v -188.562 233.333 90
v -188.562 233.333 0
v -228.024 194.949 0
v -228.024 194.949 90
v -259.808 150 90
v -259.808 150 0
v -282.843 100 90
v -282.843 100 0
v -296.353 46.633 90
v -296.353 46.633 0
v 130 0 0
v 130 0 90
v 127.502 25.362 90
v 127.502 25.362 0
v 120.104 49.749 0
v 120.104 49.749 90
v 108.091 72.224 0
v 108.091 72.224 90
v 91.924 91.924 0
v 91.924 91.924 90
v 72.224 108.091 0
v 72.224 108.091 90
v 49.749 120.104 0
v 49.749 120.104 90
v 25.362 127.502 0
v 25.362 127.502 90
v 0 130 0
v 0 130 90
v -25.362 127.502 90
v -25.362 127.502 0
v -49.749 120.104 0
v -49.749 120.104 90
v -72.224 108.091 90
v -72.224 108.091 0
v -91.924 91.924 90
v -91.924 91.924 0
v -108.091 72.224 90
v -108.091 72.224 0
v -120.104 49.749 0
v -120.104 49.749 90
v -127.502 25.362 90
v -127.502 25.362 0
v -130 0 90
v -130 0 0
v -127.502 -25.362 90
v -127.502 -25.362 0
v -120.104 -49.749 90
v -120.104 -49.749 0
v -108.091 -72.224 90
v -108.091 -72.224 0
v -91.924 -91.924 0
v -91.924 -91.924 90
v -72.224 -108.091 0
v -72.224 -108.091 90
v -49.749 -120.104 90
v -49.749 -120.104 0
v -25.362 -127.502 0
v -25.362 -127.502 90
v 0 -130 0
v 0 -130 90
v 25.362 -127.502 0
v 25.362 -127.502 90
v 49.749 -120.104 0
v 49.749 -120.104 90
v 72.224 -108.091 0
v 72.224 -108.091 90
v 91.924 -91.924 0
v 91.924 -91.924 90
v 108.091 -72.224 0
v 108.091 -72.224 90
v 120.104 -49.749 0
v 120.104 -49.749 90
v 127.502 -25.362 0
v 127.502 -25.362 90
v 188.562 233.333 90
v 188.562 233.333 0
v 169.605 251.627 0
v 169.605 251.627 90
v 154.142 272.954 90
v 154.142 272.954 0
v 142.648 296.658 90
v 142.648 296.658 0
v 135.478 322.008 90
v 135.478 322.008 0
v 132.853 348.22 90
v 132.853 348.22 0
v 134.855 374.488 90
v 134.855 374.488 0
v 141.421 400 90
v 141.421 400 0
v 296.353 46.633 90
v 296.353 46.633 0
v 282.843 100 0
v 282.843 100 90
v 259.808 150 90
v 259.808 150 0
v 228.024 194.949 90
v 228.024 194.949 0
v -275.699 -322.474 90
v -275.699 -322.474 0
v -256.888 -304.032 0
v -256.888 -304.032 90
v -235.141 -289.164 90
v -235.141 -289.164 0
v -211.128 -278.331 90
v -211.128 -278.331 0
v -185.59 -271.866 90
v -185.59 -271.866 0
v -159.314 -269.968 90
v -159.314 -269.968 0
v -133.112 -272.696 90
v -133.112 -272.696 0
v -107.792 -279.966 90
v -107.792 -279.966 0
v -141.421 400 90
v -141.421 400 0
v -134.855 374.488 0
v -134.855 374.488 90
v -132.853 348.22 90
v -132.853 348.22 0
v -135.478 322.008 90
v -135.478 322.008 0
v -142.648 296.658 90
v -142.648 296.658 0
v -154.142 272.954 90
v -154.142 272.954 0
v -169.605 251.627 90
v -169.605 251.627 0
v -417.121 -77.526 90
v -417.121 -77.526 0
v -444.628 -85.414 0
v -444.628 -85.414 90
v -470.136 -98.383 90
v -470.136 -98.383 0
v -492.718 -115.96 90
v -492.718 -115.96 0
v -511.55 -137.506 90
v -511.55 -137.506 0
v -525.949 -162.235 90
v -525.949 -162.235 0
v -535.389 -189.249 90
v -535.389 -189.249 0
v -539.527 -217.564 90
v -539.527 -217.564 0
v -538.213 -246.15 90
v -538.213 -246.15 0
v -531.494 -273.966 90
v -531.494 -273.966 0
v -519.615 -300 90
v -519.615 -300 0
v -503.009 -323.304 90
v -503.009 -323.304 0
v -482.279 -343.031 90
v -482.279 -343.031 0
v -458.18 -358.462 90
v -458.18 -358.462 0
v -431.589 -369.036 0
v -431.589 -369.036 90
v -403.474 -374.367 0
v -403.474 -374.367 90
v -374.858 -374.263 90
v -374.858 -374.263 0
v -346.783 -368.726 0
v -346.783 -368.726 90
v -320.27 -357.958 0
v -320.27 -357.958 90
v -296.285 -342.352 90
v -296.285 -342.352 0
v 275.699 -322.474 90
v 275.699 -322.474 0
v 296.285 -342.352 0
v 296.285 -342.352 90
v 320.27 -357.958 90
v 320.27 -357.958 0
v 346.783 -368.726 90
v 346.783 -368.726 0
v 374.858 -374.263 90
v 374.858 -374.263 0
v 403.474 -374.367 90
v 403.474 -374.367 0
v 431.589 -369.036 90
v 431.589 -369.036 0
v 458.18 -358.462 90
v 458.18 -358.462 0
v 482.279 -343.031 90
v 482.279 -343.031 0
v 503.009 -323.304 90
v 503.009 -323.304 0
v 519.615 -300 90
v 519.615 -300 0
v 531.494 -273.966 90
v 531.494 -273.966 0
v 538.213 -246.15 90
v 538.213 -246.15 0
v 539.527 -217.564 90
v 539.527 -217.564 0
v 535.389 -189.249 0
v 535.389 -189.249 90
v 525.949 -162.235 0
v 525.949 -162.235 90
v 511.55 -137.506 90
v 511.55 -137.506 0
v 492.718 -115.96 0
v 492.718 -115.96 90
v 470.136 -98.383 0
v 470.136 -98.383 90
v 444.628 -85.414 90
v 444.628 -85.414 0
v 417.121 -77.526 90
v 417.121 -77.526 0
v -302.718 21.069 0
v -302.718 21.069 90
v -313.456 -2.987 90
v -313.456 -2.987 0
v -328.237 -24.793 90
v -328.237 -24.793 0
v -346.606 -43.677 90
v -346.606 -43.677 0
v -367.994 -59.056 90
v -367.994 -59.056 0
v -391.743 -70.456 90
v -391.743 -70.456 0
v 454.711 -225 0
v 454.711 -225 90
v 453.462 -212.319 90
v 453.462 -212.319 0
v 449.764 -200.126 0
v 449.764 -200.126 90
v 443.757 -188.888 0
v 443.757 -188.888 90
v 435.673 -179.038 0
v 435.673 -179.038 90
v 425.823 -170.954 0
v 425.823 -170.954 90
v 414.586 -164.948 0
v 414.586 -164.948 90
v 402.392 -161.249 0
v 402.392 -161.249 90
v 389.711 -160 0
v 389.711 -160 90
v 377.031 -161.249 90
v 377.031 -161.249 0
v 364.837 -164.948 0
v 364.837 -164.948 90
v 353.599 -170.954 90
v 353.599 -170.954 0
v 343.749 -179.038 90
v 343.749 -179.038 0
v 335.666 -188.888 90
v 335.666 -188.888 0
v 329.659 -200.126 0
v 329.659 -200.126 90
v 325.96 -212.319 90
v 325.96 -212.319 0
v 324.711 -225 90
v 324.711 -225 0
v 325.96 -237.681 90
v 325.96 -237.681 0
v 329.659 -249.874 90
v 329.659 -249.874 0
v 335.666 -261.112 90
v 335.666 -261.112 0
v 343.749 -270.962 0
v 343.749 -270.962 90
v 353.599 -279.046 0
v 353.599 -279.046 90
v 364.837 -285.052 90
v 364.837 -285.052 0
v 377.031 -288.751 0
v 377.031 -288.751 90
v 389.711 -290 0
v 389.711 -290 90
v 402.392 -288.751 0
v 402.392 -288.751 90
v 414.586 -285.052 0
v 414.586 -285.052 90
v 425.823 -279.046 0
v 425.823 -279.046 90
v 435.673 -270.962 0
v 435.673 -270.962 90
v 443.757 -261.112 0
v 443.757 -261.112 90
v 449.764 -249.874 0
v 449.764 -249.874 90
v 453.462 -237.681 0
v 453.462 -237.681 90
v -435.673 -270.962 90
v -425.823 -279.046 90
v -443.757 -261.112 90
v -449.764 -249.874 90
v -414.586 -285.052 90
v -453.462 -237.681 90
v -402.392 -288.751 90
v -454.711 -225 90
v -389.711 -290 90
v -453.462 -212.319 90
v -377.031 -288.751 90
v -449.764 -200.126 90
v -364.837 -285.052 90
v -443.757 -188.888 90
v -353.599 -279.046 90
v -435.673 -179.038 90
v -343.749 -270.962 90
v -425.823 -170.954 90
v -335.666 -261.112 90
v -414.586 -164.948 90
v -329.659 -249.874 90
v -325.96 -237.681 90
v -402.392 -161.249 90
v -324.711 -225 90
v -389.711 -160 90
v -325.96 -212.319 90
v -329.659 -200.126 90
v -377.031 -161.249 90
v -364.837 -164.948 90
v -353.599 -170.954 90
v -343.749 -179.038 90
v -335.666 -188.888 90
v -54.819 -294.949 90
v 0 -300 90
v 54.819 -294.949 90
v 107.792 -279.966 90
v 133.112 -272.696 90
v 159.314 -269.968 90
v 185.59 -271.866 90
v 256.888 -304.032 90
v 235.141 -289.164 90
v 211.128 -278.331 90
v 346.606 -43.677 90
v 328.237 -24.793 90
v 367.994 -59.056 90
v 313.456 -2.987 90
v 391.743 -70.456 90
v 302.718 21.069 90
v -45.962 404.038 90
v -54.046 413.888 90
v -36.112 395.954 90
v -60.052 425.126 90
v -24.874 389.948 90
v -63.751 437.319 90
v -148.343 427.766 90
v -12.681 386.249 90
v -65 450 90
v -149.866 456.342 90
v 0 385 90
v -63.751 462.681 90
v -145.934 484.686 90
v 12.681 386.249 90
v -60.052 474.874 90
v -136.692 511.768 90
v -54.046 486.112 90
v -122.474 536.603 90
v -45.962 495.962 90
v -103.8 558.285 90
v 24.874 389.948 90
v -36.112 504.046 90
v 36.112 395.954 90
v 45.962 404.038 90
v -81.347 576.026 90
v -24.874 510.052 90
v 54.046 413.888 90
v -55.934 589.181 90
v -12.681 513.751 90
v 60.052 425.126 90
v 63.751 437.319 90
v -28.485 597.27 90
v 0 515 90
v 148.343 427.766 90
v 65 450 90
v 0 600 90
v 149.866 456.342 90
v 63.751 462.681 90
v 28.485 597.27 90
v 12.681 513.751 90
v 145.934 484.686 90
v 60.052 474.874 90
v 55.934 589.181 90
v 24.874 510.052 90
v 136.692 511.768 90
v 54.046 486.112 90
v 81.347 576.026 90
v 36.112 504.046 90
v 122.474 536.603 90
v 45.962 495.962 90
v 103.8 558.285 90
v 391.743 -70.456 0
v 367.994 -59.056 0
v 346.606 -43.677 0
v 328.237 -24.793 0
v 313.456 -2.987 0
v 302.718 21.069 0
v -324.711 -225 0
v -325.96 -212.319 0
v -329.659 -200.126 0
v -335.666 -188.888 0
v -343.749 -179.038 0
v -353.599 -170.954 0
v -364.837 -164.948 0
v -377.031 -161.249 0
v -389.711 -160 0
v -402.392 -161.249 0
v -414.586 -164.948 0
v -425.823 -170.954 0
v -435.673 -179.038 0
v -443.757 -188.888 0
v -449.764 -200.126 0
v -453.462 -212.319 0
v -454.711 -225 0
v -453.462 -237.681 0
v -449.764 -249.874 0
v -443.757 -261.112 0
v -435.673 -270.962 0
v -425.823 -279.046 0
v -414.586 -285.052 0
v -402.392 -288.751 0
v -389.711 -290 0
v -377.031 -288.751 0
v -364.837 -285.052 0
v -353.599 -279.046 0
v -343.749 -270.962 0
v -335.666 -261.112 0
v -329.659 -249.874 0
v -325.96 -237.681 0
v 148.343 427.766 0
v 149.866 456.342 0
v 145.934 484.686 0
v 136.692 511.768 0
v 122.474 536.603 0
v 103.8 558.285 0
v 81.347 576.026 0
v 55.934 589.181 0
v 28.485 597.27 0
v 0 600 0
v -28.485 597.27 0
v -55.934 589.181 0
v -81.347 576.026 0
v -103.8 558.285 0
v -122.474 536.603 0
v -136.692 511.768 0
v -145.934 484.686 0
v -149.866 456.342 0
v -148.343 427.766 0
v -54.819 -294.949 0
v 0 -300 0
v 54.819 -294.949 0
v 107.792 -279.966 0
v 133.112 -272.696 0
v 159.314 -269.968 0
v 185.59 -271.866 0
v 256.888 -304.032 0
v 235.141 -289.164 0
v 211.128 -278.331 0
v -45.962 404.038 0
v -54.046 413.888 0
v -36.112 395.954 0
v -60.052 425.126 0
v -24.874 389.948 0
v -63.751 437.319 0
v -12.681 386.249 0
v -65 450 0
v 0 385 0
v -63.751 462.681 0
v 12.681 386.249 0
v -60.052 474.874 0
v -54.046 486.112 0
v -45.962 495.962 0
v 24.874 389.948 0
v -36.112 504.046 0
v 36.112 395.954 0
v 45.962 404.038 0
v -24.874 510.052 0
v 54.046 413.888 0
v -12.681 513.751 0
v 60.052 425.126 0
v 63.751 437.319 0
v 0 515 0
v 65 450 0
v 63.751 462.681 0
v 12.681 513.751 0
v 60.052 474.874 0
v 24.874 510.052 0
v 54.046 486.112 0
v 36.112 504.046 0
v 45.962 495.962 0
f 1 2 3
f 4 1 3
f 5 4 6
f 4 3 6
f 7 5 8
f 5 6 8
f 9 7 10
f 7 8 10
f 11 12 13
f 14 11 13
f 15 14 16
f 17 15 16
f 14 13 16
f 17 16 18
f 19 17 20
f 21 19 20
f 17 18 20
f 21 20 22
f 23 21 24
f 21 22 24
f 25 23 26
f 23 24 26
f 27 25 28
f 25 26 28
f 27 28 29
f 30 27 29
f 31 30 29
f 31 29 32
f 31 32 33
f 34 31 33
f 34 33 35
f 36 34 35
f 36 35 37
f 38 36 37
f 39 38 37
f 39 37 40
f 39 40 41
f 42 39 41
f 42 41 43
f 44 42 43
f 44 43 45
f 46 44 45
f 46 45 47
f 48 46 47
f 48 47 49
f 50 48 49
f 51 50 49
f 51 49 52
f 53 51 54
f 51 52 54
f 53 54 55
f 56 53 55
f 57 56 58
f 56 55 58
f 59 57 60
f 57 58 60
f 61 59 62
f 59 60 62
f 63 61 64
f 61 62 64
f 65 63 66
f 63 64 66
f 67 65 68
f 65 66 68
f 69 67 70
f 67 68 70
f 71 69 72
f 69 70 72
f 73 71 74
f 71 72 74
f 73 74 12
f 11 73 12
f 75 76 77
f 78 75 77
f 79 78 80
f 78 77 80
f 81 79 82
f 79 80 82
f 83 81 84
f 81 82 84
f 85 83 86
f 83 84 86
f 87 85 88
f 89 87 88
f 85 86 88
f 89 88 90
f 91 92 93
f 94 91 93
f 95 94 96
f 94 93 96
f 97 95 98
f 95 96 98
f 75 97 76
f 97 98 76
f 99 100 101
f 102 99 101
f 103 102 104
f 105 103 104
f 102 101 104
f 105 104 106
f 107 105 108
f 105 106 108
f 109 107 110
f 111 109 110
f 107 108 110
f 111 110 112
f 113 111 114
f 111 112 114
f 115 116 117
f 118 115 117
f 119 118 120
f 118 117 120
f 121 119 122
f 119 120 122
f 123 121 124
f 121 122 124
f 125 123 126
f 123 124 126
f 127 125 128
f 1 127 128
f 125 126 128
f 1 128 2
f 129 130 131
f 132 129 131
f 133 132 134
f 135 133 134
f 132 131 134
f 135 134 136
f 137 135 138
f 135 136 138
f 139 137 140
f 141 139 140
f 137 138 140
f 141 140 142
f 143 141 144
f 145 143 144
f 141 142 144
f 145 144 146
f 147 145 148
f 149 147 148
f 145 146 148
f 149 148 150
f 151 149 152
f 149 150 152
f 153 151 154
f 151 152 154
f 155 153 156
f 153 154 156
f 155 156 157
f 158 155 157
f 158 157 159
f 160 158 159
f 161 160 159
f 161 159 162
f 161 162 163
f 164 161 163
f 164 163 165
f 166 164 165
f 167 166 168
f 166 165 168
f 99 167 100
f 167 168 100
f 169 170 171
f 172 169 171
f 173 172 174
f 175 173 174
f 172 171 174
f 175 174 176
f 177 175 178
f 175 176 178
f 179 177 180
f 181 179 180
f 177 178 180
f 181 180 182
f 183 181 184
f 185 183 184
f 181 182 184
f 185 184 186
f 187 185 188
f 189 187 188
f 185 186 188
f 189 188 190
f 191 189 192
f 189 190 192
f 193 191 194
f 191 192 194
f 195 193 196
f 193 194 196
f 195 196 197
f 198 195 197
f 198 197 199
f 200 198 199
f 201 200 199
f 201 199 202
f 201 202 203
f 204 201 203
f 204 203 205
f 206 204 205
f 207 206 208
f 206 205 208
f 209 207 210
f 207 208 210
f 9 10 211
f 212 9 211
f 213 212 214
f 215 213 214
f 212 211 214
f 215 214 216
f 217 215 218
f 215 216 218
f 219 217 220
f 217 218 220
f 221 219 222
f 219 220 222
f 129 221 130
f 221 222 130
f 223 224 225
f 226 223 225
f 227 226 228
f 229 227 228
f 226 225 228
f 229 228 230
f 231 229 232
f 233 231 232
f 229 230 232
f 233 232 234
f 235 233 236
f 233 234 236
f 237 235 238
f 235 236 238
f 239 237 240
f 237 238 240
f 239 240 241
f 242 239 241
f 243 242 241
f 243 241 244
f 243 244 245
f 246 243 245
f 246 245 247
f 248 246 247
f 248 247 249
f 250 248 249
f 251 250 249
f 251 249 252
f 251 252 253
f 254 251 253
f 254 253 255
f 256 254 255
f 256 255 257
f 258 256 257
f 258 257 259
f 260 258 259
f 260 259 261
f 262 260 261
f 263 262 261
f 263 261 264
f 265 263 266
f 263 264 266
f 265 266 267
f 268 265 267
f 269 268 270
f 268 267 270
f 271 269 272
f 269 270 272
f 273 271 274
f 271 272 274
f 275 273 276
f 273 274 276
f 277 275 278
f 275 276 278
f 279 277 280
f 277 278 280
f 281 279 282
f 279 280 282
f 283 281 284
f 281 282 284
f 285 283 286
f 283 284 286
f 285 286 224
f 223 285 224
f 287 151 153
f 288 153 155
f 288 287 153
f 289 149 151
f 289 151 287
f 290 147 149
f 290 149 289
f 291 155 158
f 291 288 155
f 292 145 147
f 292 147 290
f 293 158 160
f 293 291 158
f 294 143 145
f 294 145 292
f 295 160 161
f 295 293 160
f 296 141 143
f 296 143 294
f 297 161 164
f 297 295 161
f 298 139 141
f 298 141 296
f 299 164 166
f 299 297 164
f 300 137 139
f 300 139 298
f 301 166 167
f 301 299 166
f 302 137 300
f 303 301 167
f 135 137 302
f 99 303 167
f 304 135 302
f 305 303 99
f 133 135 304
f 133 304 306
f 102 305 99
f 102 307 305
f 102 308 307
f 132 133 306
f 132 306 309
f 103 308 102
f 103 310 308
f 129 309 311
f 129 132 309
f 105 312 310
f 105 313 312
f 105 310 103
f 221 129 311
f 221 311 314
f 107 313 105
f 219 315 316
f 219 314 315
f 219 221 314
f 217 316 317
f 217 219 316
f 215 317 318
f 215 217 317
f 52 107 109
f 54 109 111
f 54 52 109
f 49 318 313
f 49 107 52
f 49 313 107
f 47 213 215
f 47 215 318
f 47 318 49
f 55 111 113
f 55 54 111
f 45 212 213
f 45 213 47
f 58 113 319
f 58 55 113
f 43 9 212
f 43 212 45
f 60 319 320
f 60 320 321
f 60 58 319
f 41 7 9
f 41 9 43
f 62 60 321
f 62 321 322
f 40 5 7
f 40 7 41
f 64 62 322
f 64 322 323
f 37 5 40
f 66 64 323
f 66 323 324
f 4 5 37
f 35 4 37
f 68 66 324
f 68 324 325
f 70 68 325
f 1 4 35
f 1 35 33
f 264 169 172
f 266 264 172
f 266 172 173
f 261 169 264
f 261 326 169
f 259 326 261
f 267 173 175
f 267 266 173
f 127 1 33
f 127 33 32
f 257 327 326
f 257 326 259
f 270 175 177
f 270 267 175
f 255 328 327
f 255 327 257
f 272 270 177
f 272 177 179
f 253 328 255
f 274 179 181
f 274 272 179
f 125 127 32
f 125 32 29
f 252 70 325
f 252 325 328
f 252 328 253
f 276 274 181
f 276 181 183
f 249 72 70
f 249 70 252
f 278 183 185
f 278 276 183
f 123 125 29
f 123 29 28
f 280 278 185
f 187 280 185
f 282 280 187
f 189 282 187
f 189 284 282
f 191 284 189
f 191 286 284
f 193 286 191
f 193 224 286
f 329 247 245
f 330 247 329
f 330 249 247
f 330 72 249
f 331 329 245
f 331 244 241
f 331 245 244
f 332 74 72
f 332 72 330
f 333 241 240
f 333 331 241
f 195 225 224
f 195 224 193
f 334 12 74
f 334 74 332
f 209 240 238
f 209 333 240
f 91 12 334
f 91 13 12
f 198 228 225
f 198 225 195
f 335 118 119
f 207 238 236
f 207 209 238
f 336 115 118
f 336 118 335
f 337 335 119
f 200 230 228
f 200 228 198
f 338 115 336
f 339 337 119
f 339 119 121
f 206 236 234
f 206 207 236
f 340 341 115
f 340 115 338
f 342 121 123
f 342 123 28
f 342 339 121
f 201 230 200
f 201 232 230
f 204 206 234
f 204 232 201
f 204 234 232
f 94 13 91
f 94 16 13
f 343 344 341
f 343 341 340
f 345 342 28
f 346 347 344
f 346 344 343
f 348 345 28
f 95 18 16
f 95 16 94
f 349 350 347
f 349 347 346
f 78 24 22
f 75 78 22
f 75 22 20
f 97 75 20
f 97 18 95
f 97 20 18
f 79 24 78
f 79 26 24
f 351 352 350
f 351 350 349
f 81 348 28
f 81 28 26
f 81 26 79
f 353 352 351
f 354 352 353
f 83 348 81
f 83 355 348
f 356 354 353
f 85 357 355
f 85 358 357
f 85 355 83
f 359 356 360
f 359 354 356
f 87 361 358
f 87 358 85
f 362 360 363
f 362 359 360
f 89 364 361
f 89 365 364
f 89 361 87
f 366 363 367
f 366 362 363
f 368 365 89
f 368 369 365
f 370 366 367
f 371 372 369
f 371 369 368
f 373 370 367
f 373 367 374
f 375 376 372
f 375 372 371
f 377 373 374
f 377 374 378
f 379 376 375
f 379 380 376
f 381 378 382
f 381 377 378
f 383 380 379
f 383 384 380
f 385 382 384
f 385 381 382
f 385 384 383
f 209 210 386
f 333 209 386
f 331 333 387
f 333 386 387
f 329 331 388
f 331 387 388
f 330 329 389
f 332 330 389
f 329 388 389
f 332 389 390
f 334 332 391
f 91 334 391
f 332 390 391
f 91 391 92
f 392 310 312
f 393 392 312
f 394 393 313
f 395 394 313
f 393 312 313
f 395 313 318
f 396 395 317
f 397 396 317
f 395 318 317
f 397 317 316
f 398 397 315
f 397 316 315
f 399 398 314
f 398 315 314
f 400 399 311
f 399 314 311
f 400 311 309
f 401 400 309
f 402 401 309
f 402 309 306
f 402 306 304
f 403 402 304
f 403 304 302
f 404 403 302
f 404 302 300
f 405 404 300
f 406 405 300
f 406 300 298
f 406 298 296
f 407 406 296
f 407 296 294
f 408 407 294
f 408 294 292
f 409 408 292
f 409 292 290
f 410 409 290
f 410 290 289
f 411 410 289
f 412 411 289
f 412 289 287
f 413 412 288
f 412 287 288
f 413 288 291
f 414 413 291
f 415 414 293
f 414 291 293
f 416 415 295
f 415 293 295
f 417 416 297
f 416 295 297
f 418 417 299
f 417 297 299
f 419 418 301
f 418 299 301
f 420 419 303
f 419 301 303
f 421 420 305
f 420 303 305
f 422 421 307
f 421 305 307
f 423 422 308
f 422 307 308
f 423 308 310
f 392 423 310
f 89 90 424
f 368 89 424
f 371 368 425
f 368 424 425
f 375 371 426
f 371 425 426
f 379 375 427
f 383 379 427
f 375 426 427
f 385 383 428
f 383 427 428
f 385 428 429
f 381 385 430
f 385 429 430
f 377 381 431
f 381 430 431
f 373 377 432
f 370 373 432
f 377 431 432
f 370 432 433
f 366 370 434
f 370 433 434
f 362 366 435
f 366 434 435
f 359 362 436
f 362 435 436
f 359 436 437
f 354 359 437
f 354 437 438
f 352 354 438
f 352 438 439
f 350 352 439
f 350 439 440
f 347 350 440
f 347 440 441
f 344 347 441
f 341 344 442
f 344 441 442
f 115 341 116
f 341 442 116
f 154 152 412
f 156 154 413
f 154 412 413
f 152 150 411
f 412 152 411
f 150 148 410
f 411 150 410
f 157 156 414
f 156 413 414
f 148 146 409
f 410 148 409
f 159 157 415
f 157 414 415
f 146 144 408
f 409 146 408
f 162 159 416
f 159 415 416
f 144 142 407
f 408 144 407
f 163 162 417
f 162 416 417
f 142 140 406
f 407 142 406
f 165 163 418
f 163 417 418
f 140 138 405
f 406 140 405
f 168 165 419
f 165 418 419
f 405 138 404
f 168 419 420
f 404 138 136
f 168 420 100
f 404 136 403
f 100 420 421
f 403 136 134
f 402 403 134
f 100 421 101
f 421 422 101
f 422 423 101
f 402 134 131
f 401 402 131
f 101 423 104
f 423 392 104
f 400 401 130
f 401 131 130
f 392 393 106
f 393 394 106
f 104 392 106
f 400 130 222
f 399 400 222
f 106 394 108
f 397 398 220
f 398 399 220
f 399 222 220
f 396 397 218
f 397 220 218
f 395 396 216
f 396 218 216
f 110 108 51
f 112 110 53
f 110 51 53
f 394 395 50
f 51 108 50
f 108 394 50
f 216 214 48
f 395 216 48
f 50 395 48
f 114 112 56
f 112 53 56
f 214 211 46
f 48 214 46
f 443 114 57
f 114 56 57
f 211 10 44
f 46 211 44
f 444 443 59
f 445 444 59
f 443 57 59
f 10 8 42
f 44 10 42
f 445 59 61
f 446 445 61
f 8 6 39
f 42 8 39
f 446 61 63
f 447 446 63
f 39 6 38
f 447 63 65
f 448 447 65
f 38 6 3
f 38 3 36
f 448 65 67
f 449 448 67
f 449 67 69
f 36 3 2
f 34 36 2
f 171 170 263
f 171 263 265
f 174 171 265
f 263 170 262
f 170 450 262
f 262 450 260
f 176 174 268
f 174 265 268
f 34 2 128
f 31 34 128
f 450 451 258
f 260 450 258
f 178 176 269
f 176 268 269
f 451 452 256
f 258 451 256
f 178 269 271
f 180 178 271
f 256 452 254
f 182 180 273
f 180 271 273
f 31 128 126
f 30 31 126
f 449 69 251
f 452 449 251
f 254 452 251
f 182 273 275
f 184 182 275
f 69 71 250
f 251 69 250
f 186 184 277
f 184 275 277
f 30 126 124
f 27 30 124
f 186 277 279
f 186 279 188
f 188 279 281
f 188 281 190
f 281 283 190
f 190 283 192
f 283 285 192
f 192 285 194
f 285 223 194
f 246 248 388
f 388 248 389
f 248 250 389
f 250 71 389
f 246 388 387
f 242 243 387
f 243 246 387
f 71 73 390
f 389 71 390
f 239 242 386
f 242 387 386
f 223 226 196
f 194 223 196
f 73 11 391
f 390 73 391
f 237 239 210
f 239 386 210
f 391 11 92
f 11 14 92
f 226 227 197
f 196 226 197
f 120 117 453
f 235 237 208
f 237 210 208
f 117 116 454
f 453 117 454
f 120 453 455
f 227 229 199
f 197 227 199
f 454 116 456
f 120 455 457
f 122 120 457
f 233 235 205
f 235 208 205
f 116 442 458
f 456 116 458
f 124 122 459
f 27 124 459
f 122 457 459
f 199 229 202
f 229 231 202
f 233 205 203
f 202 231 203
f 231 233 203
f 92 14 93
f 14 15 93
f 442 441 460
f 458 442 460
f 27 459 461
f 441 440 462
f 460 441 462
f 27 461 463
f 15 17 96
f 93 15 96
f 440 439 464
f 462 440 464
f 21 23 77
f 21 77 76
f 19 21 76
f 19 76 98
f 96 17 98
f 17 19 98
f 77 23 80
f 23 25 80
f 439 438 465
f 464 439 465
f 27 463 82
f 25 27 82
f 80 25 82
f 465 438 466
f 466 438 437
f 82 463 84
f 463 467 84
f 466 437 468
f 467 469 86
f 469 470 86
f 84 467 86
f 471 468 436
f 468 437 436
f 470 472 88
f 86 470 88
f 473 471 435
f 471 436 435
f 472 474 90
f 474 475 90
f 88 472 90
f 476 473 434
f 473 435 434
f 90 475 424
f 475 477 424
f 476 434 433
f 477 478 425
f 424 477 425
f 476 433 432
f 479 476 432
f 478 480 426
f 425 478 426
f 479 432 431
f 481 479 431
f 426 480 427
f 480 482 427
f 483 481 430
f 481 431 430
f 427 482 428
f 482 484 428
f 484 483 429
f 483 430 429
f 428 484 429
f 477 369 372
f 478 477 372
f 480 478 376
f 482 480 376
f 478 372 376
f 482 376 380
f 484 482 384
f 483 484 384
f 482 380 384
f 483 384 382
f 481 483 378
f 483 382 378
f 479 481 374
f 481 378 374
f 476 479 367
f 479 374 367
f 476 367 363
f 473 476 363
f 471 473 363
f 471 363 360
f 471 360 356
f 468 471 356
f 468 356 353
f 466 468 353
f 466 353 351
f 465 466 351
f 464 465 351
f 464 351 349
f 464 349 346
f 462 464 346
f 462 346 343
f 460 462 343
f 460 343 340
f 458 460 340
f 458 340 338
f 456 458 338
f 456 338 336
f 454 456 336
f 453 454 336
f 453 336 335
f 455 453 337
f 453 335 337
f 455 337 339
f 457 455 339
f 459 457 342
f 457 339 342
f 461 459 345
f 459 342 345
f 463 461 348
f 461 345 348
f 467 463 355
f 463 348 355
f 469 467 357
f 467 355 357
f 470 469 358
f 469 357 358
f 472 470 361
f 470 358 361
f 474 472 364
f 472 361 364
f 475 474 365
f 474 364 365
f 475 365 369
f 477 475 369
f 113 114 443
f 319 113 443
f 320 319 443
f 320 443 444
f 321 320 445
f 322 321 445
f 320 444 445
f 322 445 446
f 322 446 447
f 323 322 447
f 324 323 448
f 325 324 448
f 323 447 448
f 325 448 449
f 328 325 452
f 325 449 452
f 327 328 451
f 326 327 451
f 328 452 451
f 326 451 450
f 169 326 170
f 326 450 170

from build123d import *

# Parameters (mm, degrees)
BOSS_EXTRUDE1_DEPTH = 90
SKETCH2_R           = 65
CUT_EXTRUDE1_DEPTH  = 813.027357612
SKETCH3_R           = 130
CUT_EXTRUDE2_DEPTH  = 813.027357612


with BuildPart() as part:
    # Sketch1 → Boss-Extrude1 (new body)
    with BuildSketch(Plane.XY):
        with BuildLine():
            ThreePointArc((-188.561808316, 233.333333333), (-259.807621135, 150), (-296.353498375, 46.632649519))
            ThreePointArc((-296.353498375, 46.632649519), (-337.006124854, -34.638611198), (-417.120839632, -77.525512861))
            ThreePointArc((-417.120839632, -77.525512861), (-519.615242271, -300), (-275.699483395, -322.474487139))
            ThreePointArc((-275.699483395, -322.474487139), (-198.500979677, -274.536559755), (-107.791690058, -279.965982852))
            ThreePointArc((-107.791690058, -279.965982852), (0, -300), (107.791690058, -279.965982852))
            ThreePointArc((107.791690058, -279.965982852), (198.500979677, -274.536559755), (275.699483395, -322.474487139))
            ThreePointArc((275.699483395, -322.474487139), (519.615242271, -300), (417.120839632, -77.525512861))
            ThreePointArc((417.120839632, -77.525512861), (337.006124854, -34.638611198), (296.353498375, 46.632649519))
            ThreePointArc((296.353498375, 46.632649519), (259.807621135, 150), (188.561808316, 233.333333333))
            ThreePointArc((188.561808316, 233.333333333), (138.505145177, 309.175170954), (141.421356237, 400))
            ThreePointArc((141.421356237, 400), (0, 600), (-141.421356237, 400))
            ThreePointArc((-141.421356237, 400), (-138.505145177, 309.175170954), (-188.561808316, 233.333333333))
        make_face()
    extrude(amount=BOSS_EXTRUDE1_DEPTH)

    # Sketch2 → Cut-Extrude1 (cut, through all)
    with BuildSketch(Plane.XY.offset(90)):
        with Locations((0, 450)):
            Circle(SKETCH2_R)
        with Locations((-389.711431703, -225)):
            Circle(SKETCH2_R)
        with Locations((389.711431703, -225)):
            Circle(SKETCH2_R)
    extrude(amount=-CUT_EXTRUDE1_DEPTH, mode=Mode.SUBTRACT)

    # Sketch3 → Cut-Extrude2 (cut, through all)
    with BuildSketch(Plane.XY.offset(90)):
        Circle(SKETCH3_R)
    extrude(amount=-CUT_EXTRUDE2_DEPTH, mode=Mode.SUBTRACT)


solid = part.part
